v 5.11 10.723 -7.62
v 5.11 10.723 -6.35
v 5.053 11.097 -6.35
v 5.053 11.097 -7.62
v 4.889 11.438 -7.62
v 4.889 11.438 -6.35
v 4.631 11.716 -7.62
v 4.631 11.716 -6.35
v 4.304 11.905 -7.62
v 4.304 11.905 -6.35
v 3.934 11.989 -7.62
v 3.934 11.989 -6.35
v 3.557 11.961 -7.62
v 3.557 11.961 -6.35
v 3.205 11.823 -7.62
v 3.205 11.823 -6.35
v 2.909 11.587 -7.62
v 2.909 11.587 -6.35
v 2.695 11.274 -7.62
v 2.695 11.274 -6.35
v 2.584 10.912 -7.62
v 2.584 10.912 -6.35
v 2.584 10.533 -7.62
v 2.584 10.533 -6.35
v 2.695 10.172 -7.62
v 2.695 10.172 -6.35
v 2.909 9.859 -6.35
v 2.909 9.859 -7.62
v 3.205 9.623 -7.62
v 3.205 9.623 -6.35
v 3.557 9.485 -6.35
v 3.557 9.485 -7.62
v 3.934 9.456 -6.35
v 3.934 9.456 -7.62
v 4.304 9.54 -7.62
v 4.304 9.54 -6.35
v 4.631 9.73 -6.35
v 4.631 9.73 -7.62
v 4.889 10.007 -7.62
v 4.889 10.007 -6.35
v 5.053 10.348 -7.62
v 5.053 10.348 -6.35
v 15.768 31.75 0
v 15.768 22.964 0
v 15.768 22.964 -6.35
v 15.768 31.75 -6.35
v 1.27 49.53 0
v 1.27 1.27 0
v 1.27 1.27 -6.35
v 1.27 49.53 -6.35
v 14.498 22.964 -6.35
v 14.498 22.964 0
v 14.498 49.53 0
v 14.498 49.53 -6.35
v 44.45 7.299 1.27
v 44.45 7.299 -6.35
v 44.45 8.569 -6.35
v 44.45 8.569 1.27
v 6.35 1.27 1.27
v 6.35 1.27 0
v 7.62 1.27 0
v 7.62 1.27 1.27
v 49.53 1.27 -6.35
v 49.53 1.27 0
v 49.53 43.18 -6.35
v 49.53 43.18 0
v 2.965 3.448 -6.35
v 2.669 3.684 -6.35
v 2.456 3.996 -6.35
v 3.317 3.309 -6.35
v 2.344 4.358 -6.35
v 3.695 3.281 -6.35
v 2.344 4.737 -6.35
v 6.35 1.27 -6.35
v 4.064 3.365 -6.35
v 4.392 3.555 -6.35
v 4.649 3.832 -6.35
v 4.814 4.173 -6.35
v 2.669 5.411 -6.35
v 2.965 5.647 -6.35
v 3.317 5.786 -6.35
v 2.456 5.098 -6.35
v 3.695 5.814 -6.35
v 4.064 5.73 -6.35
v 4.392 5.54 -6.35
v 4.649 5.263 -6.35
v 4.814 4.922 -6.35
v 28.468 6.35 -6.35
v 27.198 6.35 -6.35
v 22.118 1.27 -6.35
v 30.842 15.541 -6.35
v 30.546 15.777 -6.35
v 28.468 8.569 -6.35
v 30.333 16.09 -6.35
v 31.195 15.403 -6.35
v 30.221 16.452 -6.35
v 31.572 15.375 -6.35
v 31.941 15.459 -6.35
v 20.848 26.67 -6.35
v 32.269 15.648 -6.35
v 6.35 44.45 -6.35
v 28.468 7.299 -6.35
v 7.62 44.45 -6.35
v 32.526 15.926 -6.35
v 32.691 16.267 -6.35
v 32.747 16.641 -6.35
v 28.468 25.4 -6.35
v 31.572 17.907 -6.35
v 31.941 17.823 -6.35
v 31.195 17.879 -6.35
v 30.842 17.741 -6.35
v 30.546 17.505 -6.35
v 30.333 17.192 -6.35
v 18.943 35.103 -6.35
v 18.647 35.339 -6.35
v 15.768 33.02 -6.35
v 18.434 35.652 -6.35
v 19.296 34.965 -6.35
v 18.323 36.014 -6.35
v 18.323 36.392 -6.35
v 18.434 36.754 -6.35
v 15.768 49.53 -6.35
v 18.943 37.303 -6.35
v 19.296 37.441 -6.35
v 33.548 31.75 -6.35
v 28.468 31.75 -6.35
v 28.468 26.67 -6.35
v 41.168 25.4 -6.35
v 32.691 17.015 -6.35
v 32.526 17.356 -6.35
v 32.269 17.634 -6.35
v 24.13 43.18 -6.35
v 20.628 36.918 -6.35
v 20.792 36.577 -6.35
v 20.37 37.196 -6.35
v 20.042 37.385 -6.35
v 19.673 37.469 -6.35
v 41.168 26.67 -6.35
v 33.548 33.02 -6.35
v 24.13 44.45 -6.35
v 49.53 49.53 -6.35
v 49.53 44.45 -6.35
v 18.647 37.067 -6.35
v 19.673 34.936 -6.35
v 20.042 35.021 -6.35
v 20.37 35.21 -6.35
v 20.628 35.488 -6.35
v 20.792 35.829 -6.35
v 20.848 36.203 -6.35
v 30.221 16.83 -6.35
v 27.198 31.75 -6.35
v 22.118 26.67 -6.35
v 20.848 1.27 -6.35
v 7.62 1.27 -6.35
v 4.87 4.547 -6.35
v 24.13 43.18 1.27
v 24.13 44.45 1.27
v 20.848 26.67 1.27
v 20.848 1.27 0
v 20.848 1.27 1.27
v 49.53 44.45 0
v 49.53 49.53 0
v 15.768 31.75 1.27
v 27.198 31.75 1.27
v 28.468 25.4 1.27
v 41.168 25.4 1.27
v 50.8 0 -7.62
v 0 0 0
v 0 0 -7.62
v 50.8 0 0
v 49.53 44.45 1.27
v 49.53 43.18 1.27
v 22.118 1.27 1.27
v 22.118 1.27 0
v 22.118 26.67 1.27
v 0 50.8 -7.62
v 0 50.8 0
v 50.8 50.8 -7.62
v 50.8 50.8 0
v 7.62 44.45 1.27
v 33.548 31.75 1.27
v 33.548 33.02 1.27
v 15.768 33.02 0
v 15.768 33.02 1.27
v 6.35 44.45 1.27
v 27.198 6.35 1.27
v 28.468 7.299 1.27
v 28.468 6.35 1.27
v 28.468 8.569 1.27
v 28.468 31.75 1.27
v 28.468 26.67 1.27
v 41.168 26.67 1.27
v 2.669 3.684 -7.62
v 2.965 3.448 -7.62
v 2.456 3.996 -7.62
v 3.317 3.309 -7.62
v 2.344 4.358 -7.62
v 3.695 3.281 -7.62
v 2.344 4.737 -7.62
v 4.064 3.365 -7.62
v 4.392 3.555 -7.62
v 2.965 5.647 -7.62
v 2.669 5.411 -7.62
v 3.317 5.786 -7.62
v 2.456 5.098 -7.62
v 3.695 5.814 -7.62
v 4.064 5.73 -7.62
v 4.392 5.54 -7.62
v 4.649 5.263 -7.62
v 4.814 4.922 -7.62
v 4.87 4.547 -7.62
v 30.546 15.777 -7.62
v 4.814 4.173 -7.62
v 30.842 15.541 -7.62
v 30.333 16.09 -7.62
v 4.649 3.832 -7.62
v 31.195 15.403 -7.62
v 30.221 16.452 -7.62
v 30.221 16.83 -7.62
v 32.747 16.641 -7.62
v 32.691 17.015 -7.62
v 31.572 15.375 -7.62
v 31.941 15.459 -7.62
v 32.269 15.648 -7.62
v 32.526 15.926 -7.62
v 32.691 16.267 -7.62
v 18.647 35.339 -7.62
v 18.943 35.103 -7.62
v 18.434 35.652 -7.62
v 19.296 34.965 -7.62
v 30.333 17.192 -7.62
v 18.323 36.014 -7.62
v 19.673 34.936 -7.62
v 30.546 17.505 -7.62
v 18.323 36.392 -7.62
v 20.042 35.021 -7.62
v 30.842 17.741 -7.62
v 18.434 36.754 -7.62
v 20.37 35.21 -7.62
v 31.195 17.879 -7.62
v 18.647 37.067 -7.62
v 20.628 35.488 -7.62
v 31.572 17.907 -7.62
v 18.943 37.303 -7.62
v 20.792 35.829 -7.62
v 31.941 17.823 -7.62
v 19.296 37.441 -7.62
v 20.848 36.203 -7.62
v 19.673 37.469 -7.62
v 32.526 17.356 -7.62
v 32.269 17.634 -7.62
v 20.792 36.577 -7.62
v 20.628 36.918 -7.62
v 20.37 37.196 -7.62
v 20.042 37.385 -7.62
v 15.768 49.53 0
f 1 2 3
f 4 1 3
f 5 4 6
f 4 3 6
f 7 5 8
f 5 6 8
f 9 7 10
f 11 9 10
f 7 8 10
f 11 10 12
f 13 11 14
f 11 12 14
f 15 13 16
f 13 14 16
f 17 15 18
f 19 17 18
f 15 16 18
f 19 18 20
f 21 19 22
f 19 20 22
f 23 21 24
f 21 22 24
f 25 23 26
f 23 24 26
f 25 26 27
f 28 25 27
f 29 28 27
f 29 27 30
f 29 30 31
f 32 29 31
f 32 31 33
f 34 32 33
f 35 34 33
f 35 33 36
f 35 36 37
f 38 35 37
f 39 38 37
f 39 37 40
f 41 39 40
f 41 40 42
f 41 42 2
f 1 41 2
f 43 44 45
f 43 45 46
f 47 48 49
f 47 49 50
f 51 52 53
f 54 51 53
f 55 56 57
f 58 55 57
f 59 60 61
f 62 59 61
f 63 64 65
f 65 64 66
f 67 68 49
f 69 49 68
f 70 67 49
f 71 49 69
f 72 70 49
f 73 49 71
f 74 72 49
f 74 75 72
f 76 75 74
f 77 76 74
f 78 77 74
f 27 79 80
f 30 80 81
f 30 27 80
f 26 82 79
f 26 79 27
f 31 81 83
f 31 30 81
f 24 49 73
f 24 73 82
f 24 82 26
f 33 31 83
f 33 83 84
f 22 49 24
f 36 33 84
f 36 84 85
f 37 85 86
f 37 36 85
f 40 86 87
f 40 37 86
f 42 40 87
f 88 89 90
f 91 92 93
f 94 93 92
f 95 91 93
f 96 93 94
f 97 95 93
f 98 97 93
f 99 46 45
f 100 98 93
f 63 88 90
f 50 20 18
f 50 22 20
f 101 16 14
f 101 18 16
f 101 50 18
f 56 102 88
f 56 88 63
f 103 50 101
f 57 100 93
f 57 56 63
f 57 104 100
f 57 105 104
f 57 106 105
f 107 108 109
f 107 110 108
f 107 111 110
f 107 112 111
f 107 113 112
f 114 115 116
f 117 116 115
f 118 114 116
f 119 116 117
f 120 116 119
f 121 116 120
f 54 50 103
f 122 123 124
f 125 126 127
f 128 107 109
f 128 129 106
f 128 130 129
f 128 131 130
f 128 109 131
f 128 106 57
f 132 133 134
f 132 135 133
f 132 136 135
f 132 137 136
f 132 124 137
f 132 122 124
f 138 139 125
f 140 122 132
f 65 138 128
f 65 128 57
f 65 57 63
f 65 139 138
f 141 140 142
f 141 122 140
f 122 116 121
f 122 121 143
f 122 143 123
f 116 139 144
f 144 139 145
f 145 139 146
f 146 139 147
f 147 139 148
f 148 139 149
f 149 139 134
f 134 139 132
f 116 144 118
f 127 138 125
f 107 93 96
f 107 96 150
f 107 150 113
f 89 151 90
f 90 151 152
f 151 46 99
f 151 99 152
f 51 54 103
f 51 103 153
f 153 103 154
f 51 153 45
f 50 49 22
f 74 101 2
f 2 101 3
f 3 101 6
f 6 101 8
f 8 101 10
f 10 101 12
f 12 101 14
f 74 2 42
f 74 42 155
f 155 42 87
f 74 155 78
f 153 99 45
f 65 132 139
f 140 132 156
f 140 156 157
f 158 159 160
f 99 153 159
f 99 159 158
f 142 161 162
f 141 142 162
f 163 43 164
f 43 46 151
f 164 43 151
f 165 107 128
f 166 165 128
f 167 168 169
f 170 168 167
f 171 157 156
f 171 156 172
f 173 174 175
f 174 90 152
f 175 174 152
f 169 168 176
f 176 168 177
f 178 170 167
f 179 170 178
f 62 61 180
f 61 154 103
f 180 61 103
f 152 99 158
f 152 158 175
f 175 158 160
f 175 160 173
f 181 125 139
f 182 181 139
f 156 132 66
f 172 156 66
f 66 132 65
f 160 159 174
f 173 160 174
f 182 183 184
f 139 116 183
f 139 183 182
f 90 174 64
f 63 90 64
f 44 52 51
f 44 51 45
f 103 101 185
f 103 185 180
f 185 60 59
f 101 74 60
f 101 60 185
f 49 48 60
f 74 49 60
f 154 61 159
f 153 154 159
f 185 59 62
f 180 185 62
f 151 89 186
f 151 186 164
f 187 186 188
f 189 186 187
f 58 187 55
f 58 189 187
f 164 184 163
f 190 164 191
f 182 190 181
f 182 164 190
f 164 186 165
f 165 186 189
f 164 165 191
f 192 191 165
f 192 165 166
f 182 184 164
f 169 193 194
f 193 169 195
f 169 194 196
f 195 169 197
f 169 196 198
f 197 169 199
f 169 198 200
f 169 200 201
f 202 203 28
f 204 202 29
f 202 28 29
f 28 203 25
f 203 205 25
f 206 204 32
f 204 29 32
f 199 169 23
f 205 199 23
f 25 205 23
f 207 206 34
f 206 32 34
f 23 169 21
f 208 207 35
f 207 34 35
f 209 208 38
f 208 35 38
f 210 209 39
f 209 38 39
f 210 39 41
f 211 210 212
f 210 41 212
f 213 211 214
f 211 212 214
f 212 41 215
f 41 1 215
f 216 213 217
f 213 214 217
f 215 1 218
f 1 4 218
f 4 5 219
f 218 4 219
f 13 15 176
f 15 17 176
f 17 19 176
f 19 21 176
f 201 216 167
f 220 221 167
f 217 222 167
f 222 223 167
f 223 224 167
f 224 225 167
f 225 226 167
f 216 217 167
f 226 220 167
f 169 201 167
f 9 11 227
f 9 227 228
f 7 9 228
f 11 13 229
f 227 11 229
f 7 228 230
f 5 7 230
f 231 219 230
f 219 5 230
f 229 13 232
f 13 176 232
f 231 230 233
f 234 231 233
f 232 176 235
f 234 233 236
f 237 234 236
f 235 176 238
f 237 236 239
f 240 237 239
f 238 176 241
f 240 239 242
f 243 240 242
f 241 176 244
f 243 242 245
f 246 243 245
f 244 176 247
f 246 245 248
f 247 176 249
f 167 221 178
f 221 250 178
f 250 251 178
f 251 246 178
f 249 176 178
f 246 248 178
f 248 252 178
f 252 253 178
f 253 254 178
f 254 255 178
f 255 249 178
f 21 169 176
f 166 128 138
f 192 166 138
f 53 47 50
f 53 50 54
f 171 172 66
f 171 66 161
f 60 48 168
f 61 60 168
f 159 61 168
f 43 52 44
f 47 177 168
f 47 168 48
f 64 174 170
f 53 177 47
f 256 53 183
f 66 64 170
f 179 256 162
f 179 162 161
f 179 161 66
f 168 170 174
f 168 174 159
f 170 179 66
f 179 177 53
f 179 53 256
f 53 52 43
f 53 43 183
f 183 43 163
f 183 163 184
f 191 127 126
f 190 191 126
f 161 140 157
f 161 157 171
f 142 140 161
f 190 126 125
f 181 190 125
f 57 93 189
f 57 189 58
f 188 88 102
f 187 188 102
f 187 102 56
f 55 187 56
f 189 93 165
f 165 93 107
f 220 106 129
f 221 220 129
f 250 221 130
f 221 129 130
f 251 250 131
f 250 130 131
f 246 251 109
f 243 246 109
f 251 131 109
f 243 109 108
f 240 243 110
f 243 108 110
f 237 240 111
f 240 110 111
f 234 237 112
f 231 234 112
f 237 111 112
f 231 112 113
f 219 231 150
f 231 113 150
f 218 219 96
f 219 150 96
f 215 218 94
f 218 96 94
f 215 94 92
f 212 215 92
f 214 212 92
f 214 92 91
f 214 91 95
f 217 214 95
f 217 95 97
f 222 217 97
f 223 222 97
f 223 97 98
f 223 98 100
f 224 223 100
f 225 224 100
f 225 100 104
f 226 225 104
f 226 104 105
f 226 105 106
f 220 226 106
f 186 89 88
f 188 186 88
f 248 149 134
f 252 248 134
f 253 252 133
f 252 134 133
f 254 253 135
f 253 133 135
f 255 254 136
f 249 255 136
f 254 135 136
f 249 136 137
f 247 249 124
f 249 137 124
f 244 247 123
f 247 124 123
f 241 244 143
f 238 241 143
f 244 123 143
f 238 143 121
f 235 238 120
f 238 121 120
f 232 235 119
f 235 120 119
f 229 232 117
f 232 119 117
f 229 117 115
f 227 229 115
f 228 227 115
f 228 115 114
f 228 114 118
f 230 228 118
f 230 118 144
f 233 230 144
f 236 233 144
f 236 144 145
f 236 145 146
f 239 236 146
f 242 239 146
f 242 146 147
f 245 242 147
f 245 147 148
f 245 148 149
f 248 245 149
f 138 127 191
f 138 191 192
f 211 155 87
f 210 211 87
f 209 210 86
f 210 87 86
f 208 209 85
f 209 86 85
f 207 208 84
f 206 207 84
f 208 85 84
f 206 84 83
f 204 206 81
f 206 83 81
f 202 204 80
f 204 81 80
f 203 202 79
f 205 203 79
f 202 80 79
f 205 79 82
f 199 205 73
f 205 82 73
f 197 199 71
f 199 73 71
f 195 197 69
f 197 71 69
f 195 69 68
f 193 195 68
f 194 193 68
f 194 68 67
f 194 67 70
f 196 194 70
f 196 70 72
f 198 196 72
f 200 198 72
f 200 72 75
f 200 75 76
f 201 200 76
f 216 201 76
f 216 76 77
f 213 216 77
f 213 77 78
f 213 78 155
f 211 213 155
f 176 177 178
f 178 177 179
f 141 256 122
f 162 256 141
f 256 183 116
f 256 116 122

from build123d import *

# Parameters (mm, degrees)
F0_W      = 50.8
F0_H      = 50.8
F1_DEPTH  = 7.62
F2_T      = -1.27
F3_W      = 1.27
F3_H      = 43.18
F4_DEPTH  = 7.62
F5_W      = 1.27
F5_H      = 26.6756825149
F6_DEPTH  = 7.62
F7_W      = 1.27
F7_H      = 25.4
F8_DEPTH  = 7.62
F9_W      = 17.78
F9_H      = 1.27
F10_DEPTH = 7.62
F11_W     = 1.27
F11_H     = 25.4
F12_DEPTH = 7.62
F13_W     = 12.7
F13_H     = 1.27
F14_DEPTH = 7.62
F15_W     = 15.9816620052
F15_H     = 1.27
F16_DEPTH = 7.62
F17_W     = 25.4
F17_H     = 1.27
F18_DEPTH = 7.62
F19_R     = 1.27
F20_DEPTH = 203.2


# Not quite as in the source:
# - a feature names something its author has since deleted; it is built from what else it names


with BuildPart() as f1:
    # F0 (on Top) → F1 (new body)
    with BuildSketch(Plane.XY):
        with Locations((25.4, 25.4)):
            Rectangle(F0_W, F0_H)
    extrude(amount=-F1_DEPTH)

    # F2
    f2_openings = [f1.faces().sort_by_distance(p)[0] for p in [
        (25.4, 25.4, 0),
    ]]
    offset(amount=F2_T, openings=f2_openings)

    # F3 (on face) → F4 (join)
    with BuildSketch(Plane.XY.offset(-6.35)):
        with Locations((6.985, 22.86)):
            Rectangle(F3_W, F3_H)
    extrude(amount=F4_DEPTH)

    # F5 (on Top) → F6 (join)
    with BuildSketch(Plane.XY):
        with Locations((15.1333379948, 36.3023299724)):
            Rectangle(F5_W, F5_H)
    extrude(amount=-F6_DEPTH)

    # F7 (on face) → F8 (join)
    with BuildSketch(Plane.XY.offset(-6.35)):
        with Locations((21.4833379948, 13.97)):
            Rectangle(F7_W, F7_H)
    extrude(amount=F8_DEPTH)

    # F9 (on face) → F10 (join)
    with BuildSketch(Plane.XY.offset(-6.35)):
        with Locations((24.6583379948, 32.385)):
            Rectangle(F9_W, F9_H)
    extrude(amount=F10_DEPTH)

    # F11 (on face) → F12 (join)
    with BuildSketch(Plane.XY.offset(-6.35)):
        with Locations((27.8333379948, 19.05)):
            Rectangle(F11_W, F11_H)
    extrude(amount=F12_DEPTH)

    # F13 (on face) → F14 (join)
    with BuildSketch(Plane.XY.offset(-6.35)):
        with Locations((34.8183379948, 26.035)):
            Rectangle(F13_W, F13_H)
    extrude(amount=F14_DEPTH)

    # F15 (on face) → F16 (join)
    with BuildSketch(Plane.XY.offset(-6.35)):
        with Locations((36.4591689974, 7.9343094056)):
            Rectangle(F15_W, F15_H)
    extrude(amount=F16_DEPTH)

    # F17 (on face) → F18 (join)
    with BuildSketch(Plane.XY.offset(-6.35)):
        with Locations((36.83, 43.815)):
            Rectangle(F17_W, F17_H)
    extrude(amount=F18_DEPTH)

    # F19 (on face) → F20 (cut)
    with BuildSketch(Plane.XY.offset(-6.35)):
        with Locations((3.6000448745, 4.547465127)):
            Circle(F19_R)
        with Locations((3.8395691663, 10.7227088884)):
            Circle(F19_R)
        with Locations((19.5783379948, 36.2029448152)):
            Circle(F19_R)
        with Locations((31.4771048725, 16.6409648955)):
            Circle(F19_R)
    extrude(amount=-F20_DEPTH, mode=Mode.SUBTRACT)


solid = f1.part
